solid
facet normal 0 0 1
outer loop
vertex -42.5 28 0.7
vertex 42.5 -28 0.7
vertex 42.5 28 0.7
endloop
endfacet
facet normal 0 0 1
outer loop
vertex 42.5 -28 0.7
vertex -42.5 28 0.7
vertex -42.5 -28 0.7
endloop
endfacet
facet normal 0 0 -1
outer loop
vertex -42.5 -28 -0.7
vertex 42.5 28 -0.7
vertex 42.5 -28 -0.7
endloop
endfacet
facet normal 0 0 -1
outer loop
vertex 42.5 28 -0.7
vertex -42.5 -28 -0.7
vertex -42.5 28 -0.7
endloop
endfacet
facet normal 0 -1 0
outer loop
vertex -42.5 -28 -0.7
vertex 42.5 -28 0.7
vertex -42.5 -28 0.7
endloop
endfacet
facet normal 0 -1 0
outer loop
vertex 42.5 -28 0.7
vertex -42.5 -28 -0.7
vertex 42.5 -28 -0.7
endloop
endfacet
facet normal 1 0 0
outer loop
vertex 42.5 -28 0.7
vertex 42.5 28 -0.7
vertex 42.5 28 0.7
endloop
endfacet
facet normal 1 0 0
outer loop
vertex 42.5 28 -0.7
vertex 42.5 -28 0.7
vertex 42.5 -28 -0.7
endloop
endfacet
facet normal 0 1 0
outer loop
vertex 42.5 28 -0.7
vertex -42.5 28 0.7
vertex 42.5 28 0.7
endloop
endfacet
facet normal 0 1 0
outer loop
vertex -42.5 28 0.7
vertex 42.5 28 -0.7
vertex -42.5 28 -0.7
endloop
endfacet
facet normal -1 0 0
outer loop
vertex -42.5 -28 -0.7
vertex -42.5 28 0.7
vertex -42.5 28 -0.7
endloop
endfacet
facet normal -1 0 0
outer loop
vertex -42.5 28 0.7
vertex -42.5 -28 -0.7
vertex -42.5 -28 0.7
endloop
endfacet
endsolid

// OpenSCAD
// Parameters
pcb_length = 85; //[42.5:170:0.5]
pcb_width = 56; //[28:112:0.5]
pcb_thickness = 1.4; //[0.7:2.8:0.1]

// Main PCB Body
module pcb_main_body() {
  color([0.0, 0.4, 0.2]) // Green color for PCB
  translate([0, 0, 0])
    cube([pcb_length, pcb_width, pcb_thickness], center=true);
}

// Final SBC Model
module sbc_model_union() {
  union() {
    pcb_main_body();
  }
}

// Render the SBC Model
sbc_model_union();
